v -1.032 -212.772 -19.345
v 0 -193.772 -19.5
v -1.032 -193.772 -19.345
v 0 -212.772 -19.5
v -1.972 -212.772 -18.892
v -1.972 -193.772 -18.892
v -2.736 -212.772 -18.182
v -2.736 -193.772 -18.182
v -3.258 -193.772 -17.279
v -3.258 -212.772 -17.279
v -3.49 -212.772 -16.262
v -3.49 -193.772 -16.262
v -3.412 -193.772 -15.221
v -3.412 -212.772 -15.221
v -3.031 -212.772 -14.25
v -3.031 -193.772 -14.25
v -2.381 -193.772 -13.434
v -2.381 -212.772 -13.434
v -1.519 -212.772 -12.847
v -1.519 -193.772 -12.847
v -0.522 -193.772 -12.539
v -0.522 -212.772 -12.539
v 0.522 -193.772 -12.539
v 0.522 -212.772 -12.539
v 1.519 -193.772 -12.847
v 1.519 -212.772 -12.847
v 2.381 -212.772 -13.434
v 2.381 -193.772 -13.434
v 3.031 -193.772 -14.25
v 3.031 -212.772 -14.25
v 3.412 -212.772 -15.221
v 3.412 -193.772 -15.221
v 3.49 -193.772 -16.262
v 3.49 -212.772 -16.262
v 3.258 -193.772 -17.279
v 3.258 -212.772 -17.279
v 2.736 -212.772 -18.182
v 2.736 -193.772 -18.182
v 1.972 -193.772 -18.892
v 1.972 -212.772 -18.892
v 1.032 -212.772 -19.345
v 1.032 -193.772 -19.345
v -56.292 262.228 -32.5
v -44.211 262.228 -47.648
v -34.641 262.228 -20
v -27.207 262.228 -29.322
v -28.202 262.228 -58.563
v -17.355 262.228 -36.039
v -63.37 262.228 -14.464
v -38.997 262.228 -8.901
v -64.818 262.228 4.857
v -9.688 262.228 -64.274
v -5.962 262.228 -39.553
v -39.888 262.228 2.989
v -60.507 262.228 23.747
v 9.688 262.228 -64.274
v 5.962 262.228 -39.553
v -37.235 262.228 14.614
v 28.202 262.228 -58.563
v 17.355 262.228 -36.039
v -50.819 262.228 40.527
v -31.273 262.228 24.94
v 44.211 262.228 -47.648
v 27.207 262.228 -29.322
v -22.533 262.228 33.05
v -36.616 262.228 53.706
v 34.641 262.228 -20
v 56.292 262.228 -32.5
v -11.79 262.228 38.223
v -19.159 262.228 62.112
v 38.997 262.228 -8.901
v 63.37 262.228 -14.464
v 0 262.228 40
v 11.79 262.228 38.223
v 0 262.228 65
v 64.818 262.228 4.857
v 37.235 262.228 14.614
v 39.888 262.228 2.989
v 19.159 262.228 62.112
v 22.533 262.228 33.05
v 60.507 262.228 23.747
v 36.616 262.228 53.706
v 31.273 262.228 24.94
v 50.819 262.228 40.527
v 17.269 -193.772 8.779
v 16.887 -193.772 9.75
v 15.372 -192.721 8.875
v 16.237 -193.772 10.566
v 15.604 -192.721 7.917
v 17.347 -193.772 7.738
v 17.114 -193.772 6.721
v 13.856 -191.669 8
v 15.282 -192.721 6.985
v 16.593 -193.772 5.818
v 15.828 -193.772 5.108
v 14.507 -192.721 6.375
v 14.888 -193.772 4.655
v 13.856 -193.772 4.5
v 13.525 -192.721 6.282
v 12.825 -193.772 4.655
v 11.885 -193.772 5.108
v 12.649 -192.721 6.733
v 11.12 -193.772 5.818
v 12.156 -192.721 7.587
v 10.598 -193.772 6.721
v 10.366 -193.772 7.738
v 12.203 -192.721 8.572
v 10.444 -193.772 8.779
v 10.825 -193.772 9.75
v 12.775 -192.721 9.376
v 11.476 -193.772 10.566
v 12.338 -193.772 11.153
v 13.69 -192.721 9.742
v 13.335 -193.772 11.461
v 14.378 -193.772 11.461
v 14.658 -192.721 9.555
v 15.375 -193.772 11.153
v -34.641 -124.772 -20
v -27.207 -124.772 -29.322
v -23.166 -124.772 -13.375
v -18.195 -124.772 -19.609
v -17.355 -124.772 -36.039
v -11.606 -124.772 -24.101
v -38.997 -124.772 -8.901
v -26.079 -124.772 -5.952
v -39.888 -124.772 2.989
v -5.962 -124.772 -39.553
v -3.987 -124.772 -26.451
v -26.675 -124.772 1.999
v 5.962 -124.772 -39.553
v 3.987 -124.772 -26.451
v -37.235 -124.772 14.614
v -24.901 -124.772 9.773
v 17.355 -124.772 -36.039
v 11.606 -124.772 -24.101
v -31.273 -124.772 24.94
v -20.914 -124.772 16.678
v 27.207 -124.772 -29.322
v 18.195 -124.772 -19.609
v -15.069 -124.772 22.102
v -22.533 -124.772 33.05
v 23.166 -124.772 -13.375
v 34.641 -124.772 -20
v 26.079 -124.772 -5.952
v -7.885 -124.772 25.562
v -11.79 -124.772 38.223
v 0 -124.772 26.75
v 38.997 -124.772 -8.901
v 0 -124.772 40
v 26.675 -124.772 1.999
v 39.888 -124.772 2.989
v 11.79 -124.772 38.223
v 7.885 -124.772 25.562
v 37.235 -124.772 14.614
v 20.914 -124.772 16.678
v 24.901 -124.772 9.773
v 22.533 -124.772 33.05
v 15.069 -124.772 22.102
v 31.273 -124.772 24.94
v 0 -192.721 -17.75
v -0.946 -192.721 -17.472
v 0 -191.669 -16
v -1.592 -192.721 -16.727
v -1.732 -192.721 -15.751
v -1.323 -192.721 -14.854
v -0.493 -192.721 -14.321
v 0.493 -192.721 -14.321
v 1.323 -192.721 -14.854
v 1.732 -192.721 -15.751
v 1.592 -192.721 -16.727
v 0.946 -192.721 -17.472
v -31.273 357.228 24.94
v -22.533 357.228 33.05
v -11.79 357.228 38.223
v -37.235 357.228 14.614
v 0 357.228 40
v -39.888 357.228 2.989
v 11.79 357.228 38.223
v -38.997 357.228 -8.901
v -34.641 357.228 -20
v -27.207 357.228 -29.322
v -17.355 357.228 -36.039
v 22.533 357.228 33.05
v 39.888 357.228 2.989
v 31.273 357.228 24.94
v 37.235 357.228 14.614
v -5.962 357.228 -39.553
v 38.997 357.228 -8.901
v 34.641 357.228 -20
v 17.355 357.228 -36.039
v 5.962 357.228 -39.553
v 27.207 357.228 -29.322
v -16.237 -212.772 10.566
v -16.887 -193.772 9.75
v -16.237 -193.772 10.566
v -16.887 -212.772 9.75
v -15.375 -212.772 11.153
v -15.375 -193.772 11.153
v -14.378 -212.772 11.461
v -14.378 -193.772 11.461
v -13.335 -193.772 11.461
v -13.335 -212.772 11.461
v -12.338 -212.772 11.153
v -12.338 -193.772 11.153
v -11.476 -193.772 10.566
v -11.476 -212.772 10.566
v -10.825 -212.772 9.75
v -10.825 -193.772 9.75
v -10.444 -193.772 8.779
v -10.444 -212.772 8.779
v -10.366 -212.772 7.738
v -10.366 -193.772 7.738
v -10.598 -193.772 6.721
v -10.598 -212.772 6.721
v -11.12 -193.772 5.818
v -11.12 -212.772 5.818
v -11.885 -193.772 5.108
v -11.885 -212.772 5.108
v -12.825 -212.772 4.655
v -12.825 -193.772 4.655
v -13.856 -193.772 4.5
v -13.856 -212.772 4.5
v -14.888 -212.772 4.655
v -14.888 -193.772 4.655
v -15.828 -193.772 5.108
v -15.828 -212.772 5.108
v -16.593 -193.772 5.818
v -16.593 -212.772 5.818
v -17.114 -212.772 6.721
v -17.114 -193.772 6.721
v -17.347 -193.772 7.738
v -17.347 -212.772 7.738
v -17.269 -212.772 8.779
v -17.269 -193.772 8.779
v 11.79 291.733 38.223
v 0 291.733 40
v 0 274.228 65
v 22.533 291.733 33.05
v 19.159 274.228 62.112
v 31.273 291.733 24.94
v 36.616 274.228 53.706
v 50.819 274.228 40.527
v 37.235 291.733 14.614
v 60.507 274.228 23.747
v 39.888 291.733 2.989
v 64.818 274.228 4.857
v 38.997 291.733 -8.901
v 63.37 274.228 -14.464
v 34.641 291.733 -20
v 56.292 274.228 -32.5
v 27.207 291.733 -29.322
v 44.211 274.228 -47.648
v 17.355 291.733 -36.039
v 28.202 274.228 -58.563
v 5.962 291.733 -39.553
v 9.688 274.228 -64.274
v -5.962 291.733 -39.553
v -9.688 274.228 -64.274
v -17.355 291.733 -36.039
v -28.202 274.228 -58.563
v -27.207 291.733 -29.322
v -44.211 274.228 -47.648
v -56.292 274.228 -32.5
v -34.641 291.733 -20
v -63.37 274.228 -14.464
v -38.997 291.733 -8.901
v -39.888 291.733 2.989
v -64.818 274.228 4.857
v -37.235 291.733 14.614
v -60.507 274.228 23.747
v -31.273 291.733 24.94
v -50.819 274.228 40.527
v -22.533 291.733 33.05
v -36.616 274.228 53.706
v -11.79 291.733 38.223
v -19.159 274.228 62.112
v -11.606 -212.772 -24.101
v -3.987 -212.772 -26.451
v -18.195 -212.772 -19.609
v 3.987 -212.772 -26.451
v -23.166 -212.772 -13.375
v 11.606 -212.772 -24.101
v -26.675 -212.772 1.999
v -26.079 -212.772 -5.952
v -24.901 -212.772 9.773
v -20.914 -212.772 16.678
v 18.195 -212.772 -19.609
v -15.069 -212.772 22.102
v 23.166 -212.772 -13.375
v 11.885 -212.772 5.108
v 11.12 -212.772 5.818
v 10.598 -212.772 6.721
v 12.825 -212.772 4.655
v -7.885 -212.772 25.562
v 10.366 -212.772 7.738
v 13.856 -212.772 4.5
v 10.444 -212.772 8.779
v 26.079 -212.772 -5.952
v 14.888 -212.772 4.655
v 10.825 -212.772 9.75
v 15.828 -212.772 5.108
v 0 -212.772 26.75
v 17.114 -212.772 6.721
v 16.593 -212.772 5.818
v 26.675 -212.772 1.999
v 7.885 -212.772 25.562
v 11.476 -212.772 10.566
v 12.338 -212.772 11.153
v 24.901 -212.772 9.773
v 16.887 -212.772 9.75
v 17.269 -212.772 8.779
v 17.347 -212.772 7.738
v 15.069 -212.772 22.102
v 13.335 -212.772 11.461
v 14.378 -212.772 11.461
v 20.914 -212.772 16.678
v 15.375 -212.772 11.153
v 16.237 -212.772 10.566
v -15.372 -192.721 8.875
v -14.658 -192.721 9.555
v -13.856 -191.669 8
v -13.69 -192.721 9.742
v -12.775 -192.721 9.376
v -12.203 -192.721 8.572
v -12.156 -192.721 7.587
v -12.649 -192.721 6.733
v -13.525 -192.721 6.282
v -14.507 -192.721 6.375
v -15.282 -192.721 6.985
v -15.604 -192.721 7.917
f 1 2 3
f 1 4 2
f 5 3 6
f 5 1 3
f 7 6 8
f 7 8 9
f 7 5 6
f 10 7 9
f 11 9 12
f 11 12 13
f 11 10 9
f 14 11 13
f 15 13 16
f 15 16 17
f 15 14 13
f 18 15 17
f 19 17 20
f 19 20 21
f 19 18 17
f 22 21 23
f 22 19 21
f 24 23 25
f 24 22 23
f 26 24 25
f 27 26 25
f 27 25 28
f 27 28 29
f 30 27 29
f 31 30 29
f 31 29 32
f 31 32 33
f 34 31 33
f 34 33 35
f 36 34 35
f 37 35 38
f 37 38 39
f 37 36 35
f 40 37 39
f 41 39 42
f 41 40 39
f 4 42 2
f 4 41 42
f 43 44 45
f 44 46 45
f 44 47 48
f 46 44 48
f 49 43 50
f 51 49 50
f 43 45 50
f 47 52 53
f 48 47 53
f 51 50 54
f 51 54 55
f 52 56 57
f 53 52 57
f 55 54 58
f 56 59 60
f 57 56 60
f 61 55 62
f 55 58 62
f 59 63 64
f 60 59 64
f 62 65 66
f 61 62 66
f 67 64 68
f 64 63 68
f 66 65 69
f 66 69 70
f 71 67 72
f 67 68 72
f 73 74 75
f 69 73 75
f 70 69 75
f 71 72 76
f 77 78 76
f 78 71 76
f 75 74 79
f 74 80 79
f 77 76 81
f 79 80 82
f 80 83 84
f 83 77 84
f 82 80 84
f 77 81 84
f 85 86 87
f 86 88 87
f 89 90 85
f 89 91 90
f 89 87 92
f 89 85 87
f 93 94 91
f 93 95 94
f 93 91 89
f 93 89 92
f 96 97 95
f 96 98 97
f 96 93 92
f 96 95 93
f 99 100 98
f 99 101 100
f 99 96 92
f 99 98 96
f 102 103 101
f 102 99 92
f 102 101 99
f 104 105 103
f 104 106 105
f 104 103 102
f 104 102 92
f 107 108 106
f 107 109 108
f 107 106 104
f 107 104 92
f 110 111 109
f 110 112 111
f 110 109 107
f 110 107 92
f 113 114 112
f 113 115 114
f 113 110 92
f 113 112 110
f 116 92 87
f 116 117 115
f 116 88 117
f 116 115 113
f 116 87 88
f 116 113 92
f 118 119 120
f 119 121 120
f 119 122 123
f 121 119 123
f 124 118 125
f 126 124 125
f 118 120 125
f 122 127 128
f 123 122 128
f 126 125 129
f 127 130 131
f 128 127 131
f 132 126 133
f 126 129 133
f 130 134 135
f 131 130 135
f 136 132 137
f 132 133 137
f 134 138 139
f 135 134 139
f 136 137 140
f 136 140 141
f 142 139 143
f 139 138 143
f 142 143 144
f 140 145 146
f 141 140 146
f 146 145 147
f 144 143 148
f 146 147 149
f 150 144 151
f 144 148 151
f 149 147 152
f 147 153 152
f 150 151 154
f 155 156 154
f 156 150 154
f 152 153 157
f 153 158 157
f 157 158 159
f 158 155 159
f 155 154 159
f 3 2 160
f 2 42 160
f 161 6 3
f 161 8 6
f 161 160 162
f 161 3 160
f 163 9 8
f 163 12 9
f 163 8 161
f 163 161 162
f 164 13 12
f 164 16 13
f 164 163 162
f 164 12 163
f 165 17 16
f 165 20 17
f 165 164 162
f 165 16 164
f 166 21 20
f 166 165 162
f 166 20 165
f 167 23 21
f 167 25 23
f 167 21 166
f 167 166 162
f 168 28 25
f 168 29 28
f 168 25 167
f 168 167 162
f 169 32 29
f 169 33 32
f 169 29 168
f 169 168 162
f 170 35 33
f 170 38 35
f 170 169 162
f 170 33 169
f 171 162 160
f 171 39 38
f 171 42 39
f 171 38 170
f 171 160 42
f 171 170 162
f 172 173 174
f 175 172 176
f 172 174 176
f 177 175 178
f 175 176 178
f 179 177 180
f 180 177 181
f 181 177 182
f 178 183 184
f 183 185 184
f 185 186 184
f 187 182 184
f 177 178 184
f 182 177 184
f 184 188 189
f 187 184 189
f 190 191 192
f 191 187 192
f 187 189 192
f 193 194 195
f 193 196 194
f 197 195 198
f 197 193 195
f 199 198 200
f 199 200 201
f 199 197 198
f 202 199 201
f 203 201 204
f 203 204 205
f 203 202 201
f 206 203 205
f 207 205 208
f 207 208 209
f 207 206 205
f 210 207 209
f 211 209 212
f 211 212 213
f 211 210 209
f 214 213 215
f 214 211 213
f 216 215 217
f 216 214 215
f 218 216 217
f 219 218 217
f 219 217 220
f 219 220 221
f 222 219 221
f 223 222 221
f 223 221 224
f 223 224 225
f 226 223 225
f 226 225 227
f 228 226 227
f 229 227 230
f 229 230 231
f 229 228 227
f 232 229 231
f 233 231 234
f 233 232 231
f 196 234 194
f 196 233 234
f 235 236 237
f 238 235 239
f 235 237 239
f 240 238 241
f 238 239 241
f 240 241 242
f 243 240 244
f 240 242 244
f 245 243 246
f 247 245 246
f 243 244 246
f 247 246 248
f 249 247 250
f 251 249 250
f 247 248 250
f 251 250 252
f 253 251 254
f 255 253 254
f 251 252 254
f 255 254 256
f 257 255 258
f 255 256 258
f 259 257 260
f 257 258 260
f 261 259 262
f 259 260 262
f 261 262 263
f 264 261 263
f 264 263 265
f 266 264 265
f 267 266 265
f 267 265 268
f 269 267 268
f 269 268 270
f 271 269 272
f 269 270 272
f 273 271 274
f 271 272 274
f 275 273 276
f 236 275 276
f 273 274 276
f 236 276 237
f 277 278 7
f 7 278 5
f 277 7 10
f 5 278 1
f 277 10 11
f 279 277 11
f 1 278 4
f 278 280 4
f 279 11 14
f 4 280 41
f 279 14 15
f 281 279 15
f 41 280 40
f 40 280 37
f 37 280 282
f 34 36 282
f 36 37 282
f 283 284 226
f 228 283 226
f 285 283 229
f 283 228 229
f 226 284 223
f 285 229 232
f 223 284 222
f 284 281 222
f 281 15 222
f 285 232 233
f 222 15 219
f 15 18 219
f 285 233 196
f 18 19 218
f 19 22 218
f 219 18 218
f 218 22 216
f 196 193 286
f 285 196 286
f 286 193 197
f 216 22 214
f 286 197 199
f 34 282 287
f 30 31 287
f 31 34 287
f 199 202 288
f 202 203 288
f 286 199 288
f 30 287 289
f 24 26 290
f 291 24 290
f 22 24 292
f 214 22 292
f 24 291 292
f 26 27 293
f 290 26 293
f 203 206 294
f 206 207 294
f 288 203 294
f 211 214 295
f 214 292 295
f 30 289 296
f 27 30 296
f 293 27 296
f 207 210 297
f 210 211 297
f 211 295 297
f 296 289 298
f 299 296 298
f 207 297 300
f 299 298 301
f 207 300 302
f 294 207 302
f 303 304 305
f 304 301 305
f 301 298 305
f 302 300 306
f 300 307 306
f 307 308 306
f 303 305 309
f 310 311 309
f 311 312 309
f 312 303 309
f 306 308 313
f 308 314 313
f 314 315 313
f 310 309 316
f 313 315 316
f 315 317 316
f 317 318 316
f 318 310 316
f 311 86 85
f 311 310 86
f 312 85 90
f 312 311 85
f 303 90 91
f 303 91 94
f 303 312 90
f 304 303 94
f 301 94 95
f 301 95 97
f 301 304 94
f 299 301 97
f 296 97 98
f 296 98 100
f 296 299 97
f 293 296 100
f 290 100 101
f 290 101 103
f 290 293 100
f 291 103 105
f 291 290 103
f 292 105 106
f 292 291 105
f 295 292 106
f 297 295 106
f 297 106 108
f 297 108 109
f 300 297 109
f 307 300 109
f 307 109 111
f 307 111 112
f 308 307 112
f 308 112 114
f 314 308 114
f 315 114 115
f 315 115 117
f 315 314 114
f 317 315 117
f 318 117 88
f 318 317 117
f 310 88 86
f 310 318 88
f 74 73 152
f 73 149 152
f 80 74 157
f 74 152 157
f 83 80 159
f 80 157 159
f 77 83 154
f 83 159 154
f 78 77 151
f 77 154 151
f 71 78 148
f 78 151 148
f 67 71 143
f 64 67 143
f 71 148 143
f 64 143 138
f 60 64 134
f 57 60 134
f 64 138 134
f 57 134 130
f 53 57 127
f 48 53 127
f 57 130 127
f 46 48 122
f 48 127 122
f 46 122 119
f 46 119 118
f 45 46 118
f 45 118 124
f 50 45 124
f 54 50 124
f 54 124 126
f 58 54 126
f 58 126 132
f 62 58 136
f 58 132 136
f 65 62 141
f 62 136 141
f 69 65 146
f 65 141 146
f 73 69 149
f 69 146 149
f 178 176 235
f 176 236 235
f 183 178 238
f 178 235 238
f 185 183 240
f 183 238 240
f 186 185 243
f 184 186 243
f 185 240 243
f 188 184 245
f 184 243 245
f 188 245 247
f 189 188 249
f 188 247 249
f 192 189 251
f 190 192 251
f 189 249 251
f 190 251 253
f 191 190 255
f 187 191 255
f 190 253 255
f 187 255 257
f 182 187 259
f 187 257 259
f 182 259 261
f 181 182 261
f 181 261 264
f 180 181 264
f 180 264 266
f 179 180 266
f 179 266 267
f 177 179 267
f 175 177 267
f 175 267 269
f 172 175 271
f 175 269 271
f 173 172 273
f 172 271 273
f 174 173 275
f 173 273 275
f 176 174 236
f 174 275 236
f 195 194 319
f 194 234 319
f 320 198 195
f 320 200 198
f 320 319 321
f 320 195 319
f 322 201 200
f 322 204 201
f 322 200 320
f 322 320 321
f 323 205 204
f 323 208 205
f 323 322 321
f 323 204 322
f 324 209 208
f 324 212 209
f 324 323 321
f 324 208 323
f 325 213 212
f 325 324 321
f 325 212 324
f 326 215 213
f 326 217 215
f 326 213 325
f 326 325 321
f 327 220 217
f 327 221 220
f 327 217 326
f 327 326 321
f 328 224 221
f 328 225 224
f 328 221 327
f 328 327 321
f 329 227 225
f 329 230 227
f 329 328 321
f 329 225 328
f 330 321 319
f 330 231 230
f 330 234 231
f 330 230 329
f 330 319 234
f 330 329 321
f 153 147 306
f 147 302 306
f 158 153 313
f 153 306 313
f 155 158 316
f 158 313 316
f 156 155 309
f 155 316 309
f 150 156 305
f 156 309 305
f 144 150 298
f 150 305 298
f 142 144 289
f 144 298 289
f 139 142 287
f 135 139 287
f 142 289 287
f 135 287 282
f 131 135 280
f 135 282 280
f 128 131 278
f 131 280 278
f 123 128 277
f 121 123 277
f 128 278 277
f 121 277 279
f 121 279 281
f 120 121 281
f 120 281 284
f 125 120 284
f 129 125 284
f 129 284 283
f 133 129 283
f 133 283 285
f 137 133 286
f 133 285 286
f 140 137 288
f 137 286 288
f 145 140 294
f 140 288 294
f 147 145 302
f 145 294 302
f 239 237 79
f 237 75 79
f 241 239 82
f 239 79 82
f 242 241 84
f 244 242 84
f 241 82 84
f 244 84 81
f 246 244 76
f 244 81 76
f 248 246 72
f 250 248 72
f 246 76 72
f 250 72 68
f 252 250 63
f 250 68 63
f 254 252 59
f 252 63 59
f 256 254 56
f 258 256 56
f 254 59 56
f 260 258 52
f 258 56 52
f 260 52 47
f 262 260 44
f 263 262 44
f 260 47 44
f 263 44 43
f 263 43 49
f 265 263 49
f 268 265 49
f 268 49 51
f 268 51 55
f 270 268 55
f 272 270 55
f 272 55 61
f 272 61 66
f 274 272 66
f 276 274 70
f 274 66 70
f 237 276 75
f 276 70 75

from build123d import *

# Parameters (mm, degrees)
CIRPATTERN1_COUNT = 3


with BuildPart() as part:
    # Sketch1 → Revolve1 (revolve)
    with BuildSketch(Plane(origin=(0, 0, 0), x_dir=(-1, 0, 0), z_dir=(0, 0, -1))):
        Polygon((-65, 262.227948901), (-40, 262.227948901), (-40, -124.772051099), (-26.75, -124.772051099), (-26.75, -212.772051099), (0, -212.772051099), (0, 262.227948901), (0, 357.227948901), (-40, 357.227948901), (-40, 291.733137356), (-65, 274.227948901), align=None)
    revolve(axis=Axis((0, 262.227948901, 0), (0, 1, 0)))

    # Sketch4 → M8x1.0 Tapped Hole1 (revolve, cut)
    with BuildSketch(Plane(origin=(0, -212.772051099, -16), x_dir=(0, 0, -1), z_dir=(1, 0, 0))):
        Polygon((0, 0), (0, 21.103012167), (3.5, 19), (3.5, 0), align=None)
    m8x1_0_tapped_hole1 = revolve(axis=Axis((0, -219.122051099, -16), (0, 1, 0)), mode=Mode.SUBTRACT)

    # CirPattern1: M8x1.0 Tapped Hole1 ×3 about axis
    cirpattern1_axis = Axis((0, -124.772051099, 0), (0, 1, 0))
    for i in range(1, CIRPATTERN1_COUNT):
        add(m8x1_0_tapped_hole1.rotate(cirpattern1_axis, i * 360 / CIRPATTERN1_COUNT), mode=Mode.SUBTRACT)


solid = part.part
